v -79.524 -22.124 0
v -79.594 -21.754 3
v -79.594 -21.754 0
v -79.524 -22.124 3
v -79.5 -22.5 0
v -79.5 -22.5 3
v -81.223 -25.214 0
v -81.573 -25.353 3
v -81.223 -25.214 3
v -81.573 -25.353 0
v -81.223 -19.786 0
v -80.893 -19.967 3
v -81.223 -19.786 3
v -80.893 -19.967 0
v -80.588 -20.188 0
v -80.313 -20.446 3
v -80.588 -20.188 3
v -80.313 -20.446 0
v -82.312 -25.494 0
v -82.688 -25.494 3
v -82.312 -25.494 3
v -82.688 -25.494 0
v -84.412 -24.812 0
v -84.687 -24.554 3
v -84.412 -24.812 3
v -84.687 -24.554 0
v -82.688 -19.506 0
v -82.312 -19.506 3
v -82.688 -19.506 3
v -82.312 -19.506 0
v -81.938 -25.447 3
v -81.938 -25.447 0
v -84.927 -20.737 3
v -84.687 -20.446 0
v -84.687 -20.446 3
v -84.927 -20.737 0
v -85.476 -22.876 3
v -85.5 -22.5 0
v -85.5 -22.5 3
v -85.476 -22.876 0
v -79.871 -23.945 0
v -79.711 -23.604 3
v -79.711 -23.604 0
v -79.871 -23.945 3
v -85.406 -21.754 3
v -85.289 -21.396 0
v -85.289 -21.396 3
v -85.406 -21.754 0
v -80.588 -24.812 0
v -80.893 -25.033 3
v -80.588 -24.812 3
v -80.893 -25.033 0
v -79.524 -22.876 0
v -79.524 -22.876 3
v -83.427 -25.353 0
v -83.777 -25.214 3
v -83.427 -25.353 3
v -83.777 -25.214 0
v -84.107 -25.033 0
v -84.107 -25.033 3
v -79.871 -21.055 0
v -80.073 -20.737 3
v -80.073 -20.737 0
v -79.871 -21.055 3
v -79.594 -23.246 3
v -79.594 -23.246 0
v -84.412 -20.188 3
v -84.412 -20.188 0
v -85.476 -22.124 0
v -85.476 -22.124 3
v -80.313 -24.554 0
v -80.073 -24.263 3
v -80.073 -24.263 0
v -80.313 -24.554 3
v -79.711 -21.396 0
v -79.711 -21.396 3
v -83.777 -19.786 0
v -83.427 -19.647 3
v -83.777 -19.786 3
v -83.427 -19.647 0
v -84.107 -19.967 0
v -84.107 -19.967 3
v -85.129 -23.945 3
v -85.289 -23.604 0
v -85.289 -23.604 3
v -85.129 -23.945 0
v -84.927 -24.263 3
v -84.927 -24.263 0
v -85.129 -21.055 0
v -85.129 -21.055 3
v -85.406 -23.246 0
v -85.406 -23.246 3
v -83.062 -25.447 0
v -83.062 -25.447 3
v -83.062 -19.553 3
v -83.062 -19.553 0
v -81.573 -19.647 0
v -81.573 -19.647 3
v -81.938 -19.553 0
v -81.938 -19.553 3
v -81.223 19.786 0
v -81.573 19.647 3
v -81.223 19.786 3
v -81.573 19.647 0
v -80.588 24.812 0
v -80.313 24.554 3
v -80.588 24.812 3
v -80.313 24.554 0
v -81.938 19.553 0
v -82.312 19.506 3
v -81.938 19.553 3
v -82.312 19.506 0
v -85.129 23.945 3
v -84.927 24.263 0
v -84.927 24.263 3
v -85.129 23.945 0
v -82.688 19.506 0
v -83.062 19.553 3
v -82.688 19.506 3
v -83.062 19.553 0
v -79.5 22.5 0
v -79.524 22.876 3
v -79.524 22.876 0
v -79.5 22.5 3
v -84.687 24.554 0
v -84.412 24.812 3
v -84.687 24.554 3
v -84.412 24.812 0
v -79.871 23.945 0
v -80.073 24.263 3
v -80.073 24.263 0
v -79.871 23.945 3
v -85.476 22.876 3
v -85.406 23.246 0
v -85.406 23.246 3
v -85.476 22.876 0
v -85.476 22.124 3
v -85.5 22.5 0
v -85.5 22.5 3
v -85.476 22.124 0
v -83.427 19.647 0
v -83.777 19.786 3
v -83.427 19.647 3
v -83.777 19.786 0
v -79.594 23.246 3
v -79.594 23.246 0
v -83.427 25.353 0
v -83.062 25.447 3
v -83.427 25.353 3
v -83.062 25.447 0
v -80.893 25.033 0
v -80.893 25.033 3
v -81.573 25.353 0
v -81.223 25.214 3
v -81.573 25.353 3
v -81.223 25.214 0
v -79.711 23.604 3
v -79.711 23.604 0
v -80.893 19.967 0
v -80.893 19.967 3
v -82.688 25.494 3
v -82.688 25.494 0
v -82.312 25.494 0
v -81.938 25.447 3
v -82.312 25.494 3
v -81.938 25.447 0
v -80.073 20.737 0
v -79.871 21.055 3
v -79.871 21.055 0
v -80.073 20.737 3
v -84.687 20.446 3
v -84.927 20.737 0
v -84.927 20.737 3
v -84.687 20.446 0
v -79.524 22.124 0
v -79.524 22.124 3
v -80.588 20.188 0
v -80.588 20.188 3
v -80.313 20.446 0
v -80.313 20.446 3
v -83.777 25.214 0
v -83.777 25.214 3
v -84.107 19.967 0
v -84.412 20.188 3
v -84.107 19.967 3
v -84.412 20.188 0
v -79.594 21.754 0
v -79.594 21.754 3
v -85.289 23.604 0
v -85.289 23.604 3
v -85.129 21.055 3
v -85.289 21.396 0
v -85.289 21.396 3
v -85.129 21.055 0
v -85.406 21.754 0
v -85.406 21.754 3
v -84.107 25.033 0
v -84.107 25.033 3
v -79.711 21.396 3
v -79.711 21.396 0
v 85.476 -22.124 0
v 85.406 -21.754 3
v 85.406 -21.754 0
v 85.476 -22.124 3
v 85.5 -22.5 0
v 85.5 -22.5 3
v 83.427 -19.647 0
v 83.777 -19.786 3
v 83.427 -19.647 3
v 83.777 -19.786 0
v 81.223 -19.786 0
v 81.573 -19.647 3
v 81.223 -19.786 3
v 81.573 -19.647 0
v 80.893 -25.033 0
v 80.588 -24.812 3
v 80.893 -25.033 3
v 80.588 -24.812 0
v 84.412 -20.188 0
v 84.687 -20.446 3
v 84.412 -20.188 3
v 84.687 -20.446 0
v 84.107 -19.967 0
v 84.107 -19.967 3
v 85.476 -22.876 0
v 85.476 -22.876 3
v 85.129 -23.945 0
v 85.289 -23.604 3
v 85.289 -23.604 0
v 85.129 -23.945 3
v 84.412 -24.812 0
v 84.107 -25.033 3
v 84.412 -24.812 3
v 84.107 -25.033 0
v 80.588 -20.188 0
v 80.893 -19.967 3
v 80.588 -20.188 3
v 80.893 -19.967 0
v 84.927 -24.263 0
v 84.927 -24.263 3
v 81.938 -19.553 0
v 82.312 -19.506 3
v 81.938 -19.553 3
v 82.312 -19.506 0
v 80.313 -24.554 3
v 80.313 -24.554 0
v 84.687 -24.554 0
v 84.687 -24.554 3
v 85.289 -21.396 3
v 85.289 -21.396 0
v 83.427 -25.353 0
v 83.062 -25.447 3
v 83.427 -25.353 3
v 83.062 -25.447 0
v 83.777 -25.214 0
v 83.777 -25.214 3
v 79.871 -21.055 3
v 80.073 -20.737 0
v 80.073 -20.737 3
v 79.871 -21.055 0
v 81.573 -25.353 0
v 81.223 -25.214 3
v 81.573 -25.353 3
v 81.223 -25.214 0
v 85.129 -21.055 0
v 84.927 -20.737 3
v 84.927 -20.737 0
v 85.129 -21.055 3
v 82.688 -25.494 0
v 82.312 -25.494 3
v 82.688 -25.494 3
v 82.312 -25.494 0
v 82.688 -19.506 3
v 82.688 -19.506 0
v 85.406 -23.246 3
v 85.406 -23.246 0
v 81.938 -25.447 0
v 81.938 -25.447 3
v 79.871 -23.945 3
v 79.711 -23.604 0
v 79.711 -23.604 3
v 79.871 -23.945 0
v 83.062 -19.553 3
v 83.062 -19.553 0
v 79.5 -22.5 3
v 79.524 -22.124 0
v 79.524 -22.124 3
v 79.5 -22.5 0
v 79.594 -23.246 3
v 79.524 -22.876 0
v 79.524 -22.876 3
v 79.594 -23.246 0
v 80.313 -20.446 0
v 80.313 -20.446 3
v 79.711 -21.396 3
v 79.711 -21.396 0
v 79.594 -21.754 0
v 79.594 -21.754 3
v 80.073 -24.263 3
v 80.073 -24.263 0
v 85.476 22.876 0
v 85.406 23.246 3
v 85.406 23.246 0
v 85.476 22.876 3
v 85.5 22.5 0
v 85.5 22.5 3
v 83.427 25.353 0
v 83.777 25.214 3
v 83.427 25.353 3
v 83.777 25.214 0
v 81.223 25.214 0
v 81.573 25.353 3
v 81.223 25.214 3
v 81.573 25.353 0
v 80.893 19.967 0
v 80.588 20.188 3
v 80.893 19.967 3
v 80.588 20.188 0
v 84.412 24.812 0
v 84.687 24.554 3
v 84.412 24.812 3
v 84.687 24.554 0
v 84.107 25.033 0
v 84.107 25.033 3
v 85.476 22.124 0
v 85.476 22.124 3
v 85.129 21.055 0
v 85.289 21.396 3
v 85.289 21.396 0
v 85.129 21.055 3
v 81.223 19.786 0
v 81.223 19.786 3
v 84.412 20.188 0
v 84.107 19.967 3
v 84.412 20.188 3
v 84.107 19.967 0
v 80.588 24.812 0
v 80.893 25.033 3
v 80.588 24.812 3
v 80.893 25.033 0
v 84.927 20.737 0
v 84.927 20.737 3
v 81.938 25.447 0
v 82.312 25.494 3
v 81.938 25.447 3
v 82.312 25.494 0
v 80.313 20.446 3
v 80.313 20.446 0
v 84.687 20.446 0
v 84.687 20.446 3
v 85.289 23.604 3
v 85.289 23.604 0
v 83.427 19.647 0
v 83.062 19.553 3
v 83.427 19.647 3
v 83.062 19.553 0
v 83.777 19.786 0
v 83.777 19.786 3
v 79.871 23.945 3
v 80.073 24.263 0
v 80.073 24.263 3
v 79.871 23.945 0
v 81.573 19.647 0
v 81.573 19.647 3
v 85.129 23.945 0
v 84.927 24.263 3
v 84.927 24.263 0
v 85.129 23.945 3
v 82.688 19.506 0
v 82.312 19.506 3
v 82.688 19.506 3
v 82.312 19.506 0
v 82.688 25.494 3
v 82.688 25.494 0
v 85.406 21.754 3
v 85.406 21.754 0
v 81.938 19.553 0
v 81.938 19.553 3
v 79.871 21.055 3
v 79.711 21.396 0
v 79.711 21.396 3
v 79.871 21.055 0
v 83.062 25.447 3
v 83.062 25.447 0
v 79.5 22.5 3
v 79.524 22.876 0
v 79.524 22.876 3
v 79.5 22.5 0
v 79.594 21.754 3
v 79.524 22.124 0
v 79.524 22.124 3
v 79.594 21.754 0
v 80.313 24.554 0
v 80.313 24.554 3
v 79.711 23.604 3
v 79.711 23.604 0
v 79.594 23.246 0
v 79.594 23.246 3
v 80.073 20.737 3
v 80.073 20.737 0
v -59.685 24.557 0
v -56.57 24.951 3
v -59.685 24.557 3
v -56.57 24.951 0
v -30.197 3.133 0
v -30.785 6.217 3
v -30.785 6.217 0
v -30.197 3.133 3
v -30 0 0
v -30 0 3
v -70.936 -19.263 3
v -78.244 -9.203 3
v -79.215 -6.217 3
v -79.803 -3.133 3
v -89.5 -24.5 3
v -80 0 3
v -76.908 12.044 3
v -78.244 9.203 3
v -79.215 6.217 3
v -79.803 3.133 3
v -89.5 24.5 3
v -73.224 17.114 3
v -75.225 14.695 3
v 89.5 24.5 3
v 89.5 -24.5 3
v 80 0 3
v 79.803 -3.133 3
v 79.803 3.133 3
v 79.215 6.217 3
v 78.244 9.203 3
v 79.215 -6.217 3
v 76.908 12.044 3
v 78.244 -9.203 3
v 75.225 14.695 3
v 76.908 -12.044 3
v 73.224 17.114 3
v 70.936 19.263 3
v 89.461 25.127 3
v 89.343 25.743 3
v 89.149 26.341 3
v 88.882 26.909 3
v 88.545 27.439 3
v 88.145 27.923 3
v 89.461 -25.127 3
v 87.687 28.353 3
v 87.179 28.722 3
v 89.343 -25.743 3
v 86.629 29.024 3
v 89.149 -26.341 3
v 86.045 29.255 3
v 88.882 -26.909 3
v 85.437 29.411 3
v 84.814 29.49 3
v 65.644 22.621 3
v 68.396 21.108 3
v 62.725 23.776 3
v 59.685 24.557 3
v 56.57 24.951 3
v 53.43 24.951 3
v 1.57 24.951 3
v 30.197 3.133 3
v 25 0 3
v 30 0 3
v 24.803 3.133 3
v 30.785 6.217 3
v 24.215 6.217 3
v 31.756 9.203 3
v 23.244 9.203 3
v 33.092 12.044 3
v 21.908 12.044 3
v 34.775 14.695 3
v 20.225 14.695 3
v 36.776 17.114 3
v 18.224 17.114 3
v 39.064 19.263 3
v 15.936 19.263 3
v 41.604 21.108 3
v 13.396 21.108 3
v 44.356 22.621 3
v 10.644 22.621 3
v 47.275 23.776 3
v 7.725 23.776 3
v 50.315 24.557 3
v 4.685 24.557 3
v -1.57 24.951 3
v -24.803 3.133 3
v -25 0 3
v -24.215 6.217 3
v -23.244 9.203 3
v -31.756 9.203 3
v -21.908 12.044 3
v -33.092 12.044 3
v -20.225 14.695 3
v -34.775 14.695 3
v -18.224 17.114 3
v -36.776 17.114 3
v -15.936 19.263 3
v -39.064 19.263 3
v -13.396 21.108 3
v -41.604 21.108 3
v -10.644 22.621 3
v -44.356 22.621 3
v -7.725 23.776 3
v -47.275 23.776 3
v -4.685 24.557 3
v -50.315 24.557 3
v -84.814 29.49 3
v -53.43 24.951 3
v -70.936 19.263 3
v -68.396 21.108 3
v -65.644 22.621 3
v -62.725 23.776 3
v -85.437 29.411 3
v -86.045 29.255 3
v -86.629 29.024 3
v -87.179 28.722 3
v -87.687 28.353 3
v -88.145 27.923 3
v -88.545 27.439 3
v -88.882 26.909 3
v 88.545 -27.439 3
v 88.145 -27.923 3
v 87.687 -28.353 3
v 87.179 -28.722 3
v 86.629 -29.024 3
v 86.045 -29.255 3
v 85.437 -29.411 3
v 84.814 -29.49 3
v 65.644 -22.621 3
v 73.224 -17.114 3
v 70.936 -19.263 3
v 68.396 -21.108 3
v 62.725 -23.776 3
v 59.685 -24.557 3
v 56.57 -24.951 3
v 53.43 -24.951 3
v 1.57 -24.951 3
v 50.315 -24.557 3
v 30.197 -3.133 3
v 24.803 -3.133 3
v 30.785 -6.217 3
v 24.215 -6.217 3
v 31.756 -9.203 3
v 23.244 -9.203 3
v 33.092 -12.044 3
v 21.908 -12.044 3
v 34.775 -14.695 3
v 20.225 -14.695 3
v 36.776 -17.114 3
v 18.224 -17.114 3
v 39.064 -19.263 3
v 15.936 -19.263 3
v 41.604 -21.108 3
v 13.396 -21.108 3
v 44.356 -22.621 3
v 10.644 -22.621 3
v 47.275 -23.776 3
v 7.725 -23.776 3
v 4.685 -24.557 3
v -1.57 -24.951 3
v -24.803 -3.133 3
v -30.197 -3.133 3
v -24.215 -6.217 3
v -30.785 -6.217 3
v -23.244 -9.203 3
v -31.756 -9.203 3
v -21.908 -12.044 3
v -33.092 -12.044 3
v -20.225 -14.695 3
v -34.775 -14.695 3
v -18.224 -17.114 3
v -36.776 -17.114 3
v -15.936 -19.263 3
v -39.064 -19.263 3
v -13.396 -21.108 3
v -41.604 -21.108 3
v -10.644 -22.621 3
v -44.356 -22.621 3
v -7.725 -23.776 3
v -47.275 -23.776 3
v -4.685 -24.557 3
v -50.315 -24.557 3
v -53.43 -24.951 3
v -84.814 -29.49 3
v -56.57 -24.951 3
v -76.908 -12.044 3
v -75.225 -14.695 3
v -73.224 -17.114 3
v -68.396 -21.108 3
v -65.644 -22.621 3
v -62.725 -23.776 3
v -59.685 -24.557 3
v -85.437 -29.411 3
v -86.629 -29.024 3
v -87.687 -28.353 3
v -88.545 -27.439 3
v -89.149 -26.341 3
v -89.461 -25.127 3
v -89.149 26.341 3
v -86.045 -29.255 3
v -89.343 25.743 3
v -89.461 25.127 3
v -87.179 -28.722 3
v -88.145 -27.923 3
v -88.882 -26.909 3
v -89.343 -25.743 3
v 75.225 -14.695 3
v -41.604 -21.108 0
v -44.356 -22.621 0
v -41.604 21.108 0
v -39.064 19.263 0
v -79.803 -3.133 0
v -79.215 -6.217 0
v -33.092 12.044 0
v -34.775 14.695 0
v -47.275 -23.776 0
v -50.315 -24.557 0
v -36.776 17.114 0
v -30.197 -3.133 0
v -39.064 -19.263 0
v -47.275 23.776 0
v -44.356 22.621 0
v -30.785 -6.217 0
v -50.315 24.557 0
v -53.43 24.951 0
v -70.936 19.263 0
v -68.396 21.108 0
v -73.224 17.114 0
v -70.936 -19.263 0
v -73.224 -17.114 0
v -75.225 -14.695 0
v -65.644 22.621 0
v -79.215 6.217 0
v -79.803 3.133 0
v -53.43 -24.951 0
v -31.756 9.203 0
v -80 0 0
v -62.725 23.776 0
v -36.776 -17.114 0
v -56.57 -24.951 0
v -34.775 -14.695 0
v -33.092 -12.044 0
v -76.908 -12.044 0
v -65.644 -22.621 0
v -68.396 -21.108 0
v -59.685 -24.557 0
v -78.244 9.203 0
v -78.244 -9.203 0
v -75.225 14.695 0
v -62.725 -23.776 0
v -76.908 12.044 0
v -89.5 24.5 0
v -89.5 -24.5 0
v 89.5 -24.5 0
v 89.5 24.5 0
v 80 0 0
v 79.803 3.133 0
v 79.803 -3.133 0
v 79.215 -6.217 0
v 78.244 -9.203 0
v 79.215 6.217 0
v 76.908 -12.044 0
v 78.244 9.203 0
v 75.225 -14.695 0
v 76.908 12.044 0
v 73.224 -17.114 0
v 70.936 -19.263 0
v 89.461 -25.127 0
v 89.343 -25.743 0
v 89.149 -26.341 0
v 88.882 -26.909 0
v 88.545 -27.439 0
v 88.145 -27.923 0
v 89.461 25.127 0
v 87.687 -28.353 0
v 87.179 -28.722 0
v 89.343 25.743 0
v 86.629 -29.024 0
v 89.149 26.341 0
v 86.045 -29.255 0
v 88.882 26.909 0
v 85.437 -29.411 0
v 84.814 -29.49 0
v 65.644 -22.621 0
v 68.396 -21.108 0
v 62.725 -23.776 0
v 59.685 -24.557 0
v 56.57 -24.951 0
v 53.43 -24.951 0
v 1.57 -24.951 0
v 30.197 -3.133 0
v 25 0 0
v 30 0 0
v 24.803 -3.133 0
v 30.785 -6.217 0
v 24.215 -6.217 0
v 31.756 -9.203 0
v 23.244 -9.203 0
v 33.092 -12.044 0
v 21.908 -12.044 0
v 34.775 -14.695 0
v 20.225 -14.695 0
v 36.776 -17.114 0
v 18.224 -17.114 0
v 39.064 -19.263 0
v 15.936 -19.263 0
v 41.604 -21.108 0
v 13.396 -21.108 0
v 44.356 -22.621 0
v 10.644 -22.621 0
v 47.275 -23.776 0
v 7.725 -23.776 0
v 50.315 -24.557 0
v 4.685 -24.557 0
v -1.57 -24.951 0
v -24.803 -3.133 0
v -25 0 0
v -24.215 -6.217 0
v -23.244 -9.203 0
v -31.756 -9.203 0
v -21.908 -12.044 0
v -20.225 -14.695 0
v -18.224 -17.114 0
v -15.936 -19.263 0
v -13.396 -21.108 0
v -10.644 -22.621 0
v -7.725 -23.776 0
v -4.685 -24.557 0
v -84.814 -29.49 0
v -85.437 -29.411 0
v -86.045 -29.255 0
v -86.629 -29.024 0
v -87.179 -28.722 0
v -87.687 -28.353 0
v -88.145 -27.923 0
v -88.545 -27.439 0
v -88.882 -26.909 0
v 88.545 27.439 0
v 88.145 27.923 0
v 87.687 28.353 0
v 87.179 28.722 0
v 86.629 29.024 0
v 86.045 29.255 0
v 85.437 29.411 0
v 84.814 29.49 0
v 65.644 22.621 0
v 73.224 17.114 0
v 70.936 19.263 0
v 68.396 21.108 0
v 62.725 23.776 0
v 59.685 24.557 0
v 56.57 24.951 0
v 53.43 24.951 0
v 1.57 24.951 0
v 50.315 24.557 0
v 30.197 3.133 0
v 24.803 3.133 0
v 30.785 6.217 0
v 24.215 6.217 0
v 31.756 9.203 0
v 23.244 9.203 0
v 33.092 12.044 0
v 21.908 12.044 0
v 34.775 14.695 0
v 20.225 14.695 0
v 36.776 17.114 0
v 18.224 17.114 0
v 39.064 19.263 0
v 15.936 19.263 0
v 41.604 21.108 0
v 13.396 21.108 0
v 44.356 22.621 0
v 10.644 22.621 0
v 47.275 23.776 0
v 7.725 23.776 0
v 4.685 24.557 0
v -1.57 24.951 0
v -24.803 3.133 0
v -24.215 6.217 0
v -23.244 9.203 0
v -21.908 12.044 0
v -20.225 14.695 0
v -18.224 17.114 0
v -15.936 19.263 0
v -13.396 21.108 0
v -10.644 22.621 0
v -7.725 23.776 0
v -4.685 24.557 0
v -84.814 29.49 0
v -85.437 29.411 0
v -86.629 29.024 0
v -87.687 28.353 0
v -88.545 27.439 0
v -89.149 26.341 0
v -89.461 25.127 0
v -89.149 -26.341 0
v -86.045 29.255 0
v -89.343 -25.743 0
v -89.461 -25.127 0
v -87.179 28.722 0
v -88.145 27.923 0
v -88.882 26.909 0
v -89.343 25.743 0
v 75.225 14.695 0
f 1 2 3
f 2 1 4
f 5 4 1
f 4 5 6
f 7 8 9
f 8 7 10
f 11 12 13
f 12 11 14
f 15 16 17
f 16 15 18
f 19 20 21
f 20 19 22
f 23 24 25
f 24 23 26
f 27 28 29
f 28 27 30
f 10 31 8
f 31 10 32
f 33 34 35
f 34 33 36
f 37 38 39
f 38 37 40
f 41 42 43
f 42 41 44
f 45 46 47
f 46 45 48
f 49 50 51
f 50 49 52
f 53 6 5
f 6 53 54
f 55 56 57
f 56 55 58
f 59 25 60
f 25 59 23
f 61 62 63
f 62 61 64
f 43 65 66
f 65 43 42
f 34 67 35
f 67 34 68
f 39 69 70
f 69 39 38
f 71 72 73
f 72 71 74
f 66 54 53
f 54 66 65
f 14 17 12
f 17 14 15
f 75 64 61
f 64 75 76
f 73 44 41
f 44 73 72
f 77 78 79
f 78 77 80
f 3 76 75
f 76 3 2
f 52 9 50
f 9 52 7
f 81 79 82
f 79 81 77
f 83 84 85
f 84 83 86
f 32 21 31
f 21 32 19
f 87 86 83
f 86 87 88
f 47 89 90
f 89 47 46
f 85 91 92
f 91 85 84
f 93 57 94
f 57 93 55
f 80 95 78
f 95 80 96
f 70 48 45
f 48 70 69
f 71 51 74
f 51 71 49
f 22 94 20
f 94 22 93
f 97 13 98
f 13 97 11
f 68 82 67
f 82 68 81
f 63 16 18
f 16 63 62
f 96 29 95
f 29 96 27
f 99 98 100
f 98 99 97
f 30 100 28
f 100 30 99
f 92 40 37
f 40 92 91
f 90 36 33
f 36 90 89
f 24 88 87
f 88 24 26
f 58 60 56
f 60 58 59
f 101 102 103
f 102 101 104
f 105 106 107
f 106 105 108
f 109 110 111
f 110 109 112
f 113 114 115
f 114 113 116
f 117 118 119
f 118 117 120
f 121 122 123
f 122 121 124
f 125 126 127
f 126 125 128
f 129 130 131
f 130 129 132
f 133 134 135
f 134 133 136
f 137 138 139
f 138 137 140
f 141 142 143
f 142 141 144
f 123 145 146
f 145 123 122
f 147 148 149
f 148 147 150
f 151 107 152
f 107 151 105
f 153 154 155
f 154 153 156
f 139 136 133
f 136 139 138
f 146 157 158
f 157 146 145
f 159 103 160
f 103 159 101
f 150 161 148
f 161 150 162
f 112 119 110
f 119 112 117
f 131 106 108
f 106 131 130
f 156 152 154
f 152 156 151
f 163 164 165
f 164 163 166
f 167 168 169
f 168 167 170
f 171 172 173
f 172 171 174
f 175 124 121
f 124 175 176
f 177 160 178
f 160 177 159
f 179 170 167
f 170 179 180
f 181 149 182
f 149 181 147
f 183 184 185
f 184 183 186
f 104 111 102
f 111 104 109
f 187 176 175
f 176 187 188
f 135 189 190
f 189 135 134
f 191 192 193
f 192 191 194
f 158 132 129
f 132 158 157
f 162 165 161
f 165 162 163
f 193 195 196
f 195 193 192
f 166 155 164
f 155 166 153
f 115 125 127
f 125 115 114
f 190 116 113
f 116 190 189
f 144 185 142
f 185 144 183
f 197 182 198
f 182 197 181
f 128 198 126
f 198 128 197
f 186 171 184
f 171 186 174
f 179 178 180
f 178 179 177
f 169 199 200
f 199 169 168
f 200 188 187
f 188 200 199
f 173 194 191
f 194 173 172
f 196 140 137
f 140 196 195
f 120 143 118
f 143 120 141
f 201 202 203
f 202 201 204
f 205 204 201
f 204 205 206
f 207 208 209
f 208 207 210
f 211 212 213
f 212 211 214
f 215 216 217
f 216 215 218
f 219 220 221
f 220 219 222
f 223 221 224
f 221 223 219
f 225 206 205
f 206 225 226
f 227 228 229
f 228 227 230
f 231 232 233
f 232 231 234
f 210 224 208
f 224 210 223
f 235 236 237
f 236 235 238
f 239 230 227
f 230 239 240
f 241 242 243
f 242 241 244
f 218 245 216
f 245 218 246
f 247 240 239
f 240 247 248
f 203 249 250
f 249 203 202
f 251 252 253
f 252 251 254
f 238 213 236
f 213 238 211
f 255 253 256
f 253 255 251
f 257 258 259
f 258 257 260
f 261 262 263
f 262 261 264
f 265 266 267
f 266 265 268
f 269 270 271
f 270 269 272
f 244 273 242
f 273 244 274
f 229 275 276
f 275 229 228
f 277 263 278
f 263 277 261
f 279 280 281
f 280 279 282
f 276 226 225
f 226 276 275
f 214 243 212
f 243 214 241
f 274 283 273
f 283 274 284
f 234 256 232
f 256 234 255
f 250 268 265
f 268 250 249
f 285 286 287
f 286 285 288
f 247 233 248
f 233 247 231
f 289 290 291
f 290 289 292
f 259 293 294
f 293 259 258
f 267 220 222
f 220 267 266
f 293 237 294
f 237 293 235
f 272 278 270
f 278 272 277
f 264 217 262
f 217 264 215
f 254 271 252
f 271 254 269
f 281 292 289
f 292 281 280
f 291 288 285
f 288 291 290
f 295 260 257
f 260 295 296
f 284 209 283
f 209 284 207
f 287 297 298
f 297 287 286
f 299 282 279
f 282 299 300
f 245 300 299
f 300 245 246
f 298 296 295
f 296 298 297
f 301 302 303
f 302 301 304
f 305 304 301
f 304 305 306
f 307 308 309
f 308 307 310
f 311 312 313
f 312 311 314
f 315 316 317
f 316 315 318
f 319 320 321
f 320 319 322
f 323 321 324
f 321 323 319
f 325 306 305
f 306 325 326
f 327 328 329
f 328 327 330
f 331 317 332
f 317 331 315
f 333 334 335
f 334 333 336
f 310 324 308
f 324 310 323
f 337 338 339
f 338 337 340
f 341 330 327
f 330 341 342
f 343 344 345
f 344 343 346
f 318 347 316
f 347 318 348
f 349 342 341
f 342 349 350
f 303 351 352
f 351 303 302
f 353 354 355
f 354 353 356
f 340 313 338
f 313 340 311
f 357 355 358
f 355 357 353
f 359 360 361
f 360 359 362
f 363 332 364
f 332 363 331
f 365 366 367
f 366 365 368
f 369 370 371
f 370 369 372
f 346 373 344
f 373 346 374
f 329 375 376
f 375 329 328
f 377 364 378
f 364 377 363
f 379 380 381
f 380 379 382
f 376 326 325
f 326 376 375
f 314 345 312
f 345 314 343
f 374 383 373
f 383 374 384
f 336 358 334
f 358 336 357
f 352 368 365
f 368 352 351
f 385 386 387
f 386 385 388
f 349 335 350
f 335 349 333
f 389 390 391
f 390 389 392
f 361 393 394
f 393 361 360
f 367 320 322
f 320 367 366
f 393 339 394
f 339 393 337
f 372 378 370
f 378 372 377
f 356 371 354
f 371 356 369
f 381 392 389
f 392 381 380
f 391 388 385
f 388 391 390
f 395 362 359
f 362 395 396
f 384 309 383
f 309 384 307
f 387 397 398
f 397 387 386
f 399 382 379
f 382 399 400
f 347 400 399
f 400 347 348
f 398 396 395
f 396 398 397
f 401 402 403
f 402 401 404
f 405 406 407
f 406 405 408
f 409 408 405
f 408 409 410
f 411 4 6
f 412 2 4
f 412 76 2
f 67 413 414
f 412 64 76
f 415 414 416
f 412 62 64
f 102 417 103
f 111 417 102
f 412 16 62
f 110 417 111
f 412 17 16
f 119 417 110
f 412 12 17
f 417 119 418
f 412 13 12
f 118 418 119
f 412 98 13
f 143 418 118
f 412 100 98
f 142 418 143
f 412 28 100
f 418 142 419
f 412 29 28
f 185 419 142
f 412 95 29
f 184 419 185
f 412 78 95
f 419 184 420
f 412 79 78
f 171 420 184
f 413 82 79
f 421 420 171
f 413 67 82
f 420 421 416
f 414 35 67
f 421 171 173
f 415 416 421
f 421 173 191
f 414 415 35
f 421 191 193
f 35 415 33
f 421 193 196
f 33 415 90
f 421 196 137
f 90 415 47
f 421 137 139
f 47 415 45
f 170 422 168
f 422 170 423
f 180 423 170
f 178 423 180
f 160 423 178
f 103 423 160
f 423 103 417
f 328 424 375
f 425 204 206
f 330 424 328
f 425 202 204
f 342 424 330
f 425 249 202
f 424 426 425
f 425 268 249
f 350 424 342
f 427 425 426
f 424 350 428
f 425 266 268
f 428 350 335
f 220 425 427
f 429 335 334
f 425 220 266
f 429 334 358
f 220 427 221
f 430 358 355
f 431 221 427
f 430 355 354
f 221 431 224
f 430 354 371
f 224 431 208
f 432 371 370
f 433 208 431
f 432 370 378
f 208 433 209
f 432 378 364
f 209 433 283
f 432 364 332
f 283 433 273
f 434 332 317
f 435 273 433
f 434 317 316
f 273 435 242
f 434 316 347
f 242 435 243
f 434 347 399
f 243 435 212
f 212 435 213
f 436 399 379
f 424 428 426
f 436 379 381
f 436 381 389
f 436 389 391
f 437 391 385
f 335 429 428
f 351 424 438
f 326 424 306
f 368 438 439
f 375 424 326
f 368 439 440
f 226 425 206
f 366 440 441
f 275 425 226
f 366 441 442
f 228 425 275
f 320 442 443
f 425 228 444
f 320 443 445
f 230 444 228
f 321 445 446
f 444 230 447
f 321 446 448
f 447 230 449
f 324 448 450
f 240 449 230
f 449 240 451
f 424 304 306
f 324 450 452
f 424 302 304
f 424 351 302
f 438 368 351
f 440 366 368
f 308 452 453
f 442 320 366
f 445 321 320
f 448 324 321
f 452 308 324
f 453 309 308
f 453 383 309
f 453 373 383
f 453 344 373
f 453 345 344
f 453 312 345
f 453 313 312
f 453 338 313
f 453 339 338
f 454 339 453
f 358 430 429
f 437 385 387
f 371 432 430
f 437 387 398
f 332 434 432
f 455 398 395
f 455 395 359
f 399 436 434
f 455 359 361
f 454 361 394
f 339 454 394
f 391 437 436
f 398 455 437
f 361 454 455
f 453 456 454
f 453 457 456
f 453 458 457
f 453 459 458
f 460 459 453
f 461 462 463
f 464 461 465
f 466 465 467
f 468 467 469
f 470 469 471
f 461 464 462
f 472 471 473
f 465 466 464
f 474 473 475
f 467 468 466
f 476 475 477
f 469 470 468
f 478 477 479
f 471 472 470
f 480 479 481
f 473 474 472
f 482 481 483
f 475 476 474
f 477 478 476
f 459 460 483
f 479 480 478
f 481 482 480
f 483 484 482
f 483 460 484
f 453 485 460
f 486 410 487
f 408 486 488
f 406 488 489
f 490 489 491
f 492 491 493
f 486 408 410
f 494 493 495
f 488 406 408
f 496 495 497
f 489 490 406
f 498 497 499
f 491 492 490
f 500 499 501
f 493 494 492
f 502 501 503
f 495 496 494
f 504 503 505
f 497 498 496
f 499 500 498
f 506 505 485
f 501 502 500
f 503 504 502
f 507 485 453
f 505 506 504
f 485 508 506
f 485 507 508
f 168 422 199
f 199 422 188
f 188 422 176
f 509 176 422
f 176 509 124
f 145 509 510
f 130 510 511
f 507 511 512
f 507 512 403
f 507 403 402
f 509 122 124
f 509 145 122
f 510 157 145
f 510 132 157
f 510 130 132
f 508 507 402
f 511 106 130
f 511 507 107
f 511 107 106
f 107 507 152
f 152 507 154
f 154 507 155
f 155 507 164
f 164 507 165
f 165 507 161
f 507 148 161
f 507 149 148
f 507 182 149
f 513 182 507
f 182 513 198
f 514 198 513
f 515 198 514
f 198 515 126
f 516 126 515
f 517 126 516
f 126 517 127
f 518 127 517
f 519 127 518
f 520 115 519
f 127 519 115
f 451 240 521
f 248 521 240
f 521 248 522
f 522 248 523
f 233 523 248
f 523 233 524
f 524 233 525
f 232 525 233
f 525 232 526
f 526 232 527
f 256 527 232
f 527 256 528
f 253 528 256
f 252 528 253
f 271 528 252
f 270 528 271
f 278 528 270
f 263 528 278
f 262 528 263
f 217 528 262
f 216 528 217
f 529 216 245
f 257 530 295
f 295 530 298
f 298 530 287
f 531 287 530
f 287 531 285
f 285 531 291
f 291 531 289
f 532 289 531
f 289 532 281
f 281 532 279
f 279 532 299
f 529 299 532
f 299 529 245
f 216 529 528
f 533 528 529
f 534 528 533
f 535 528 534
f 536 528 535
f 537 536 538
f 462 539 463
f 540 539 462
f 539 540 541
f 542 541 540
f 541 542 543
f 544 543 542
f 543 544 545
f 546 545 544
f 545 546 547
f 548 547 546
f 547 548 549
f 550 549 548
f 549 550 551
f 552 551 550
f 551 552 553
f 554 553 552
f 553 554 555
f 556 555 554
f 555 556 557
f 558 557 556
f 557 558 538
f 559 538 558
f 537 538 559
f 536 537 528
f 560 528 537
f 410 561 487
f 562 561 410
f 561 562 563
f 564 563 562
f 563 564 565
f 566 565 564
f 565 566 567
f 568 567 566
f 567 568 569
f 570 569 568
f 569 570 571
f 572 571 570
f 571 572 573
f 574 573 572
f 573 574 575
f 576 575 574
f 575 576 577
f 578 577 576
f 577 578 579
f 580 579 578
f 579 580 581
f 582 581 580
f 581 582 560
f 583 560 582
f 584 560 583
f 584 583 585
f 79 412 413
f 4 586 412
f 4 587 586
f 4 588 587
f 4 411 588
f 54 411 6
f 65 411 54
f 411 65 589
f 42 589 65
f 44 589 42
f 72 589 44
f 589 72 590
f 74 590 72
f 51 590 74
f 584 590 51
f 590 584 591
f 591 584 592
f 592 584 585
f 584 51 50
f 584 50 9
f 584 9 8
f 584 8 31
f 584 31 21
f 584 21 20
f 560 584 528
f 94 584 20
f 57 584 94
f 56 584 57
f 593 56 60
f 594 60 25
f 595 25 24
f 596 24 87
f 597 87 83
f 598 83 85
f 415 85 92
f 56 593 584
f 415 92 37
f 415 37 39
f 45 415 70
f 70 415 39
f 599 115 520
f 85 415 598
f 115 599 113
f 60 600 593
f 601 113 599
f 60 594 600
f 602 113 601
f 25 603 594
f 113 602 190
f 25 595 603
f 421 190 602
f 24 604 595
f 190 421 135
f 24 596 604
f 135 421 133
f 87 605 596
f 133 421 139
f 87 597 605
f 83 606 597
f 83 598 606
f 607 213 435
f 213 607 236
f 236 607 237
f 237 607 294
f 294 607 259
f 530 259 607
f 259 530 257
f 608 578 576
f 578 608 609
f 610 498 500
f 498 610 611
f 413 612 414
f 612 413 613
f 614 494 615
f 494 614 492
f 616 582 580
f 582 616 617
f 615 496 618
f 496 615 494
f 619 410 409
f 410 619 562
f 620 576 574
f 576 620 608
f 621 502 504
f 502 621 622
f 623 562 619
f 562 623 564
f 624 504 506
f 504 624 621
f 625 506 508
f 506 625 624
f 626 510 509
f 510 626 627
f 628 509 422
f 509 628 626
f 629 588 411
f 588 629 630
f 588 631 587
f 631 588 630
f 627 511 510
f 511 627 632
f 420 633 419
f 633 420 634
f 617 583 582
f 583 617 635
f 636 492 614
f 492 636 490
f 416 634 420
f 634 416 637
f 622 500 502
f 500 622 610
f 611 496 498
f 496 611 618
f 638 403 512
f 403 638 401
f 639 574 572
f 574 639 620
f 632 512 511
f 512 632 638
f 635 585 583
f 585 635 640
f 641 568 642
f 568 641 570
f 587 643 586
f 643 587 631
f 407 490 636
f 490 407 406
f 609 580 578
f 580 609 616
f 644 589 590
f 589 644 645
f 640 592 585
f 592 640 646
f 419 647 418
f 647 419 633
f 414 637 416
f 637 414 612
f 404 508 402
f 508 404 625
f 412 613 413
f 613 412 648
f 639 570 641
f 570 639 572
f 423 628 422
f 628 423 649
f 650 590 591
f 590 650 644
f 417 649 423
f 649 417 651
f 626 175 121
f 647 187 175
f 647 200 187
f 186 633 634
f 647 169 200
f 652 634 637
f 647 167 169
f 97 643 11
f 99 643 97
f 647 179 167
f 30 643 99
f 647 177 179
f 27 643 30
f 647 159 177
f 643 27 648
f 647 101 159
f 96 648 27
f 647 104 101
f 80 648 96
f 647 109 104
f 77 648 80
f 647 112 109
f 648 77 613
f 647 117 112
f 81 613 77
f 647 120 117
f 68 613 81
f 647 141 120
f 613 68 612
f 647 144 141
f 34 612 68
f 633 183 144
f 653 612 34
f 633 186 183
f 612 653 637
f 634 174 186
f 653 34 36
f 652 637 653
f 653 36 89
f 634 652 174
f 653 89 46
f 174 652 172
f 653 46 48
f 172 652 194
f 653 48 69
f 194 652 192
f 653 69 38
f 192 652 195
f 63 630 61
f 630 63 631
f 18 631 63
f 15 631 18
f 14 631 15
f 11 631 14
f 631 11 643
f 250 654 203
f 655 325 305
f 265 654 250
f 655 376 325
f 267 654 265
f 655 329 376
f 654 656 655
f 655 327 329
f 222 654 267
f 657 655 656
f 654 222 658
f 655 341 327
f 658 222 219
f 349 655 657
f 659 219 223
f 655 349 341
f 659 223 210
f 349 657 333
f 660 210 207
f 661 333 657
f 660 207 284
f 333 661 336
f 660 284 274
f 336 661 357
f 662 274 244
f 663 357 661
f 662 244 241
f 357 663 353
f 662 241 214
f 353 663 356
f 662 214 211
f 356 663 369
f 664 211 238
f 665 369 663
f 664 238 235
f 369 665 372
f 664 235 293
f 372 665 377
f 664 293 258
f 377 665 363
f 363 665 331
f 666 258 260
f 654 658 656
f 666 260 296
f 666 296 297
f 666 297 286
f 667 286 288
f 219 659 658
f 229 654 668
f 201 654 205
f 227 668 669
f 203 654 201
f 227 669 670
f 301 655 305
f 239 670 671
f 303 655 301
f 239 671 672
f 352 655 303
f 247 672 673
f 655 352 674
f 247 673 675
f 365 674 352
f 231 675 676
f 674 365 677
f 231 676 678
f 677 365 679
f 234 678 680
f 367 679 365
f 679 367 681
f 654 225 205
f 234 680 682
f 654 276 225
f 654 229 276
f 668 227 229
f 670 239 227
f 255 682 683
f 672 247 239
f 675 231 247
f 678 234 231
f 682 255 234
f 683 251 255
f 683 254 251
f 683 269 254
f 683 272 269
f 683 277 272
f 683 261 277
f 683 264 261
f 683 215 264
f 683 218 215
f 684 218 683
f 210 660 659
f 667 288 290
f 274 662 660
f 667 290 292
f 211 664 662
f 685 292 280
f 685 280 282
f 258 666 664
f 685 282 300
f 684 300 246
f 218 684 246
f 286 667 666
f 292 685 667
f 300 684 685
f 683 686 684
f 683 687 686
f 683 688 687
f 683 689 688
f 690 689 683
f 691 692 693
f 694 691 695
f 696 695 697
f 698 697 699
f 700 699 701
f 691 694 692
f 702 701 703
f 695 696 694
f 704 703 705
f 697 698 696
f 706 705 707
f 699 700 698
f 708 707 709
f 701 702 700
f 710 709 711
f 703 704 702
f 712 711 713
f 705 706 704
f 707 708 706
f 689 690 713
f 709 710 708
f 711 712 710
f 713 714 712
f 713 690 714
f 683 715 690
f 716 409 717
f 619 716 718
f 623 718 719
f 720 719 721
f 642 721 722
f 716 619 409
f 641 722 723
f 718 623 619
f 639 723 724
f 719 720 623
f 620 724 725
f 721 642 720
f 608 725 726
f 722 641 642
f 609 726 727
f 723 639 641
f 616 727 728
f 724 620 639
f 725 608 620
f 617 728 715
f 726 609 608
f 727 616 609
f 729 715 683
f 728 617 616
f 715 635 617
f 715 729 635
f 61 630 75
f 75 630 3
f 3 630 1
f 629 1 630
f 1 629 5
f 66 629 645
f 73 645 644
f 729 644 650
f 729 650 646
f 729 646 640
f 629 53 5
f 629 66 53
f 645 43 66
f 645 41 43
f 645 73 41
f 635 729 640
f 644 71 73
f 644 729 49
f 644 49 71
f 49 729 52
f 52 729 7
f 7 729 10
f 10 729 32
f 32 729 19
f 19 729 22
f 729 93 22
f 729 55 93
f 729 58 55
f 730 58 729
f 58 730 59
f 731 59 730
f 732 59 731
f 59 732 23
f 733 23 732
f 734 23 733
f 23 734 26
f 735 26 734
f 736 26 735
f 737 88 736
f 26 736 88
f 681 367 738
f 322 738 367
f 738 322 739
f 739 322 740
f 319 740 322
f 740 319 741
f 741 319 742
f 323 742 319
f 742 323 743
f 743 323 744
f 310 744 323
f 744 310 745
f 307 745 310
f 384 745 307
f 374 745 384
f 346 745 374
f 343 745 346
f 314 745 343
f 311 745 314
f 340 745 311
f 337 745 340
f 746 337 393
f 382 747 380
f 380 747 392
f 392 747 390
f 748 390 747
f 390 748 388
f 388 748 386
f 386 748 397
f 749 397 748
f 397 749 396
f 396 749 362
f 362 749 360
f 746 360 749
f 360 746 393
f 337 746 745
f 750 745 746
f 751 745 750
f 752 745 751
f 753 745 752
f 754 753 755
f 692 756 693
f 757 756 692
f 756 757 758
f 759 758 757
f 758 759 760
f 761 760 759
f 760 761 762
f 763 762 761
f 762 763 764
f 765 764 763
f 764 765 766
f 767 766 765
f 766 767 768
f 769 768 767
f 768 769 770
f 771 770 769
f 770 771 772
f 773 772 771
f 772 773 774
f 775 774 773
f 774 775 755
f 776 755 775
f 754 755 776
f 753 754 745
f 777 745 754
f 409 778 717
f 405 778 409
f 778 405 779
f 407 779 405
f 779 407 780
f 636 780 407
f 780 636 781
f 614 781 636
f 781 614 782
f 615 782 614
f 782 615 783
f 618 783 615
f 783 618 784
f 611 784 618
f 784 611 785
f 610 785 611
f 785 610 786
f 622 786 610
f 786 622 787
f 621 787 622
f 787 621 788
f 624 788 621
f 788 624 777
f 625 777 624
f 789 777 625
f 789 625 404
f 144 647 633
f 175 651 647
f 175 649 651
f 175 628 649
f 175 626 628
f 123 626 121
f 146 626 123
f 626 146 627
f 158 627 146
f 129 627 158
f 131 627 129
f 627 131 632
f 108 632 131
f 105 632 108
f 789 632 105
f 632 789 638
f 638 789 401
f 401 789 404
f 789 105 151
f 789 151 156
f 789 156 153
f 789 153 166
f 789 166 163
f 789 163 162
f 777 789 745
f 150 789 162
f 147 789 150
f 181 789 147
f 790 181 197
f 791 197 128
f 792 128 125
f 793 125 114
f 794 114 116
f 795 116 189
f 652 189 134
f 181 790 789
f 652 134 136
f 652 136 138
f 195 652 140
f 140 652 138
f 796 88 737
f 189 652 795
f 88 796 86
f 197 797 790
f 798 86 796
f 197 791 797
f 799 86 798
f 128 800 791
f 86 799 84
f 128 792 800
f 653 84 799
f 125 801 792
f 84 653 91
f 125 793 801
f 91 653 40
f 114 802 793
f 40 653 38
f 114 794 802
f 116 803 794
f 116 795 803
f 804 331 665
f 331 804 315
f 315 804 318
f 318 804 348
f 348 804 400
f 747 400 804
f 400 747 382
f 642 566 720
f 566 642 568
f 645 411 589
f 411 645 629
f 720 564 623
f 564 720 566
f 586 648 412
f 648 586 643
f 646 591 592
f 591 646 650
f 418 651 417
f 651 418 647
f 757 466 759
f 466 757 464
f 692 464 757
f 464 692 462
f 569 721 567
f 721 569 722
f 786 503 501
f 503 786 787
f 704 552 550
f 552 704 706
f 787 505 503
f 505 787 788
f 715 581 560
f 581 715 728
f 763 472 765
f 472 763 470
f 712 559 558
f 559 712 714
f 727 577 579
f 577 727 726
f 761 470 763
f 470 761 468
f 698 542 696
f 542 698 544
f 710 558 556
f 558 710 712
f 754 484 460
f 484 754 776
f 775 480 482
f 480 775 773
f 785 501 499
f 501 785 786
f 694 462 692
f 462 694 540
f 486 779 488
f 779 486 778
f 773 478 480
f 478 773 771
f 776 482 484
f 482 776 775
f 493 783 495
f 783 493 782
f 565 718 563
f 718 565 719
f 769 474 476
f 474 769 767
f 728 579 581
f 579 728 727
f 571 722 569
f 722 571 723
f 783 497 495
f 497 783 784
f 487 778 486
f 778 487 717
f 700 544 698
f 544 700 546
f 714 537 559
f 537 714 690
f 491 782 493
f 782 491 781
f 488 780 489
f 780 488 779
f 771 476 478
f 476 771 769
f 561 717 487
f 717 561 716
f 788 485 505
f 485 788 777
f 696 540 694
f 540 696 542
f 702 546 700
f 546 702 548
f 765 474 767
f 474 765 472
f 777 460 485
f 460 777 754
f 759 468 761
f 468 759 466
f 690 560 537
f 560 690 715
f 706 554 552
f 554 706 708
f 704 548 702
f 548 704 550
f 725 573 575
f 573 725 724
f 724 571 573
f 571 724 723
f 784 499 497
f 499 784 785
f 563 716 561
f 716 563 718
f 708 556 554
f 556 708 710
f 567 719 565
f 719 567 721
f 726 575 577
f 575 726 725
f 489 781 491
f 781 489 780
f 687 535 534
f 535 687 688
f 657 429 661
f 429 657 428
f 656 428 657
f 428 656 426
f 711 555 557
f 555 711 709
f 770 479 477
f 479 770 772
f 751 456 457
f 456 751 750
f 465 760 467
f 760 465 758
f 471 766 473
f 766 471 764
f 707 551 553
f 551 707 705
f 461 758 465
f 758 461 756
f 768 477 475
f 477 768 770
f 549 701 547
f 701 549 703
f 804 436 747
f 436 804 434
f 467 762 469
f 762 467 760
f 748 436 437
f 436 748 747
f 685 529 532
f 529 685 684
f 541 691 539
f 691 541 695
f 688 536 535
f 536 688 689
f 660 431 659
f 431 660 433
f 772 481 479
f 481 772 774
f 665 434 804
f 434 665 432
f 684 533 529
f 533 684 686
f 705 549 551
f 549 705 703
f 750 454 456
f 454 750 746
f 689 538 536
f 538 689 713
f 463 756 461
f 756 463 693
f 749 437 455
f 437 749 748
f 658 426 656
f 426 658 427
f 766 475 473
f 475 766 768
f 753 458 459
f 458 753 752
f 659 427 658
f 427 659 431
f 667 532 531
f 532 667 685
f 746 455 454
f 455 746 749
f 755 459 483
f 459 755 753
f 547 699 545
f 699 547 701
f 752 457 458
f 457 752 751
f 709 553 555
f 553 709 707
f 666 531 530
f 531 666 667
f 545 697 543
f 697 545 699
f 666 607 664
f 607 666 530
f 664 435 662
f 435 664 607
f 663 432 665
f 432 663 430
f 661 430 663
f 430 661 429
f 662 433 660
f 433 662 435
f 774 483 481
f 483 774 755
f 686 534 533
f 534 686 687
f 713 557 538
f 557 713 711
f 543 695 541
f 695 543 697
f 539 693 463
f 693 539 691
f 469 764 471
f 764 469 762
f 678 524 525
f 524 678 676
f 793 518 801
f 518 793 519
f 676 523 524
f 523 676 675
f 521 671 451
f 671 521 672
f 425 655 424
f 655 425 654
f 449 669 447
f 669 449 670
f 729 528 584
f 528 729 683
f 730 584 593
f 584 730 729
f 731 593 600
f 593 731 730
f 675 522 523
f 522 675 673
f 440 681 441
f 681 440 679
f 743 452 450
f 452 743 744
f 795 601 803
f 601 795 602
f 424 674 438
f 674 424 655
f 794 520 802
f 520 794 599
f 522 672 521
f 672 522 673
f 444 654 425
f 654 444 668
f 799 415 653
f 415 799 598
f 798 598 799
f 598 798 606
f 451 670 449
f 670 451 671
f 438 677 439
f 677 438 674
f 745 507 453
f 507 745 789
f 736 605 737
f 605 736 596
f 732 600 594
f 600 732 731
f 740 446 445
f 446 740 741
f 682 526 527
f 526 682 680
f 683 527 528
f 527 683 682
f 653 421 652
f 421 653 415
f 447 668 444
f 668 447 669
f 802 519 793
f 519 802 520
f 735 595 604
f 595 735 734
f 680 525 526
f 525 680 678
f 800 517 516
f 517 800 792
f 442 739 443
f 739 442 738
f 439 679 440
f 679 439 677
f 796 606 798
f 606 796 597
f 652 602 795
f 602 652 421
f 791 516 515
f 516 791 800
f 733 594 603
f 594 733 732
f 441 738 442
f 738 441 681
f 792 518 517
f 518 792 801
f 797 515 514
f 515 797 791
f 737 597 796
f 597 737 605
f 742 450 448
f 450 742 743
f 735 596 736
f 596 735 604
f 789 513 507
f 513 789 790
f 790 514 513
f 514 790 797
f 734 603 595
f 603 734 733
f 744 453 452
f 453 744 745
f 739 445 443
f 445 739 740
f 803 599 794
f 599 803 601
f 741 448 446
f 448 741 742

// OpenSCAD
$fn = 50;


difference() {
	union() {
		hull() {
			translate(v = [-84.5000000000, 24.5000000000, 0]) {
				cylinder(h = 3, r = 5);
			}
			translate(v = [84.5000000000, 24.5000000000, 0]) {
				cylinder(h = 3, r = 5);
			}
			translate(v = [-84.5000000000, -24.5000000000, 0]) {
				cylinder(h = 3, r = 5);
			}
			translate(v = [84.5000000000, -24.5000000000, 0]) {
				cylinder(h = 3, r = 5);
			}
		}
	}
	union() {
		#translate(v = [-82.5000000000, -22.5000000000, -100.0000000000]) {
			cylinder(h = 200, r = 3.0000000000);
		}
		#translate(v = [-82.5000000000, 22.5000000000, -100.0000000000]) {
			cylinder(h = 200, r = 3.0000000000);
		}
		#translate(v = [82.5000000000, -22.5000000000, -100.0000000000]) {
			cylinder(h = 200, r = 3.0000000000);
		}
		#translate(v = [82.5000000000, 22.5000000000, -100.0000000000]) {
			cylinder(h = 200, r = 3.0000000000);
		}
		#translate(v = [-55.0000000000, 0, 0]) {
			cylinder(h = 3, r = 25.0000000000);
		}
		#cylinder(h = 3, r = 25.0000000000);
		#translate(v = [55.0000000000, 0, 0]) {
			cylinder(h = 3, r = 25.0000000000);
		}
	}
}
